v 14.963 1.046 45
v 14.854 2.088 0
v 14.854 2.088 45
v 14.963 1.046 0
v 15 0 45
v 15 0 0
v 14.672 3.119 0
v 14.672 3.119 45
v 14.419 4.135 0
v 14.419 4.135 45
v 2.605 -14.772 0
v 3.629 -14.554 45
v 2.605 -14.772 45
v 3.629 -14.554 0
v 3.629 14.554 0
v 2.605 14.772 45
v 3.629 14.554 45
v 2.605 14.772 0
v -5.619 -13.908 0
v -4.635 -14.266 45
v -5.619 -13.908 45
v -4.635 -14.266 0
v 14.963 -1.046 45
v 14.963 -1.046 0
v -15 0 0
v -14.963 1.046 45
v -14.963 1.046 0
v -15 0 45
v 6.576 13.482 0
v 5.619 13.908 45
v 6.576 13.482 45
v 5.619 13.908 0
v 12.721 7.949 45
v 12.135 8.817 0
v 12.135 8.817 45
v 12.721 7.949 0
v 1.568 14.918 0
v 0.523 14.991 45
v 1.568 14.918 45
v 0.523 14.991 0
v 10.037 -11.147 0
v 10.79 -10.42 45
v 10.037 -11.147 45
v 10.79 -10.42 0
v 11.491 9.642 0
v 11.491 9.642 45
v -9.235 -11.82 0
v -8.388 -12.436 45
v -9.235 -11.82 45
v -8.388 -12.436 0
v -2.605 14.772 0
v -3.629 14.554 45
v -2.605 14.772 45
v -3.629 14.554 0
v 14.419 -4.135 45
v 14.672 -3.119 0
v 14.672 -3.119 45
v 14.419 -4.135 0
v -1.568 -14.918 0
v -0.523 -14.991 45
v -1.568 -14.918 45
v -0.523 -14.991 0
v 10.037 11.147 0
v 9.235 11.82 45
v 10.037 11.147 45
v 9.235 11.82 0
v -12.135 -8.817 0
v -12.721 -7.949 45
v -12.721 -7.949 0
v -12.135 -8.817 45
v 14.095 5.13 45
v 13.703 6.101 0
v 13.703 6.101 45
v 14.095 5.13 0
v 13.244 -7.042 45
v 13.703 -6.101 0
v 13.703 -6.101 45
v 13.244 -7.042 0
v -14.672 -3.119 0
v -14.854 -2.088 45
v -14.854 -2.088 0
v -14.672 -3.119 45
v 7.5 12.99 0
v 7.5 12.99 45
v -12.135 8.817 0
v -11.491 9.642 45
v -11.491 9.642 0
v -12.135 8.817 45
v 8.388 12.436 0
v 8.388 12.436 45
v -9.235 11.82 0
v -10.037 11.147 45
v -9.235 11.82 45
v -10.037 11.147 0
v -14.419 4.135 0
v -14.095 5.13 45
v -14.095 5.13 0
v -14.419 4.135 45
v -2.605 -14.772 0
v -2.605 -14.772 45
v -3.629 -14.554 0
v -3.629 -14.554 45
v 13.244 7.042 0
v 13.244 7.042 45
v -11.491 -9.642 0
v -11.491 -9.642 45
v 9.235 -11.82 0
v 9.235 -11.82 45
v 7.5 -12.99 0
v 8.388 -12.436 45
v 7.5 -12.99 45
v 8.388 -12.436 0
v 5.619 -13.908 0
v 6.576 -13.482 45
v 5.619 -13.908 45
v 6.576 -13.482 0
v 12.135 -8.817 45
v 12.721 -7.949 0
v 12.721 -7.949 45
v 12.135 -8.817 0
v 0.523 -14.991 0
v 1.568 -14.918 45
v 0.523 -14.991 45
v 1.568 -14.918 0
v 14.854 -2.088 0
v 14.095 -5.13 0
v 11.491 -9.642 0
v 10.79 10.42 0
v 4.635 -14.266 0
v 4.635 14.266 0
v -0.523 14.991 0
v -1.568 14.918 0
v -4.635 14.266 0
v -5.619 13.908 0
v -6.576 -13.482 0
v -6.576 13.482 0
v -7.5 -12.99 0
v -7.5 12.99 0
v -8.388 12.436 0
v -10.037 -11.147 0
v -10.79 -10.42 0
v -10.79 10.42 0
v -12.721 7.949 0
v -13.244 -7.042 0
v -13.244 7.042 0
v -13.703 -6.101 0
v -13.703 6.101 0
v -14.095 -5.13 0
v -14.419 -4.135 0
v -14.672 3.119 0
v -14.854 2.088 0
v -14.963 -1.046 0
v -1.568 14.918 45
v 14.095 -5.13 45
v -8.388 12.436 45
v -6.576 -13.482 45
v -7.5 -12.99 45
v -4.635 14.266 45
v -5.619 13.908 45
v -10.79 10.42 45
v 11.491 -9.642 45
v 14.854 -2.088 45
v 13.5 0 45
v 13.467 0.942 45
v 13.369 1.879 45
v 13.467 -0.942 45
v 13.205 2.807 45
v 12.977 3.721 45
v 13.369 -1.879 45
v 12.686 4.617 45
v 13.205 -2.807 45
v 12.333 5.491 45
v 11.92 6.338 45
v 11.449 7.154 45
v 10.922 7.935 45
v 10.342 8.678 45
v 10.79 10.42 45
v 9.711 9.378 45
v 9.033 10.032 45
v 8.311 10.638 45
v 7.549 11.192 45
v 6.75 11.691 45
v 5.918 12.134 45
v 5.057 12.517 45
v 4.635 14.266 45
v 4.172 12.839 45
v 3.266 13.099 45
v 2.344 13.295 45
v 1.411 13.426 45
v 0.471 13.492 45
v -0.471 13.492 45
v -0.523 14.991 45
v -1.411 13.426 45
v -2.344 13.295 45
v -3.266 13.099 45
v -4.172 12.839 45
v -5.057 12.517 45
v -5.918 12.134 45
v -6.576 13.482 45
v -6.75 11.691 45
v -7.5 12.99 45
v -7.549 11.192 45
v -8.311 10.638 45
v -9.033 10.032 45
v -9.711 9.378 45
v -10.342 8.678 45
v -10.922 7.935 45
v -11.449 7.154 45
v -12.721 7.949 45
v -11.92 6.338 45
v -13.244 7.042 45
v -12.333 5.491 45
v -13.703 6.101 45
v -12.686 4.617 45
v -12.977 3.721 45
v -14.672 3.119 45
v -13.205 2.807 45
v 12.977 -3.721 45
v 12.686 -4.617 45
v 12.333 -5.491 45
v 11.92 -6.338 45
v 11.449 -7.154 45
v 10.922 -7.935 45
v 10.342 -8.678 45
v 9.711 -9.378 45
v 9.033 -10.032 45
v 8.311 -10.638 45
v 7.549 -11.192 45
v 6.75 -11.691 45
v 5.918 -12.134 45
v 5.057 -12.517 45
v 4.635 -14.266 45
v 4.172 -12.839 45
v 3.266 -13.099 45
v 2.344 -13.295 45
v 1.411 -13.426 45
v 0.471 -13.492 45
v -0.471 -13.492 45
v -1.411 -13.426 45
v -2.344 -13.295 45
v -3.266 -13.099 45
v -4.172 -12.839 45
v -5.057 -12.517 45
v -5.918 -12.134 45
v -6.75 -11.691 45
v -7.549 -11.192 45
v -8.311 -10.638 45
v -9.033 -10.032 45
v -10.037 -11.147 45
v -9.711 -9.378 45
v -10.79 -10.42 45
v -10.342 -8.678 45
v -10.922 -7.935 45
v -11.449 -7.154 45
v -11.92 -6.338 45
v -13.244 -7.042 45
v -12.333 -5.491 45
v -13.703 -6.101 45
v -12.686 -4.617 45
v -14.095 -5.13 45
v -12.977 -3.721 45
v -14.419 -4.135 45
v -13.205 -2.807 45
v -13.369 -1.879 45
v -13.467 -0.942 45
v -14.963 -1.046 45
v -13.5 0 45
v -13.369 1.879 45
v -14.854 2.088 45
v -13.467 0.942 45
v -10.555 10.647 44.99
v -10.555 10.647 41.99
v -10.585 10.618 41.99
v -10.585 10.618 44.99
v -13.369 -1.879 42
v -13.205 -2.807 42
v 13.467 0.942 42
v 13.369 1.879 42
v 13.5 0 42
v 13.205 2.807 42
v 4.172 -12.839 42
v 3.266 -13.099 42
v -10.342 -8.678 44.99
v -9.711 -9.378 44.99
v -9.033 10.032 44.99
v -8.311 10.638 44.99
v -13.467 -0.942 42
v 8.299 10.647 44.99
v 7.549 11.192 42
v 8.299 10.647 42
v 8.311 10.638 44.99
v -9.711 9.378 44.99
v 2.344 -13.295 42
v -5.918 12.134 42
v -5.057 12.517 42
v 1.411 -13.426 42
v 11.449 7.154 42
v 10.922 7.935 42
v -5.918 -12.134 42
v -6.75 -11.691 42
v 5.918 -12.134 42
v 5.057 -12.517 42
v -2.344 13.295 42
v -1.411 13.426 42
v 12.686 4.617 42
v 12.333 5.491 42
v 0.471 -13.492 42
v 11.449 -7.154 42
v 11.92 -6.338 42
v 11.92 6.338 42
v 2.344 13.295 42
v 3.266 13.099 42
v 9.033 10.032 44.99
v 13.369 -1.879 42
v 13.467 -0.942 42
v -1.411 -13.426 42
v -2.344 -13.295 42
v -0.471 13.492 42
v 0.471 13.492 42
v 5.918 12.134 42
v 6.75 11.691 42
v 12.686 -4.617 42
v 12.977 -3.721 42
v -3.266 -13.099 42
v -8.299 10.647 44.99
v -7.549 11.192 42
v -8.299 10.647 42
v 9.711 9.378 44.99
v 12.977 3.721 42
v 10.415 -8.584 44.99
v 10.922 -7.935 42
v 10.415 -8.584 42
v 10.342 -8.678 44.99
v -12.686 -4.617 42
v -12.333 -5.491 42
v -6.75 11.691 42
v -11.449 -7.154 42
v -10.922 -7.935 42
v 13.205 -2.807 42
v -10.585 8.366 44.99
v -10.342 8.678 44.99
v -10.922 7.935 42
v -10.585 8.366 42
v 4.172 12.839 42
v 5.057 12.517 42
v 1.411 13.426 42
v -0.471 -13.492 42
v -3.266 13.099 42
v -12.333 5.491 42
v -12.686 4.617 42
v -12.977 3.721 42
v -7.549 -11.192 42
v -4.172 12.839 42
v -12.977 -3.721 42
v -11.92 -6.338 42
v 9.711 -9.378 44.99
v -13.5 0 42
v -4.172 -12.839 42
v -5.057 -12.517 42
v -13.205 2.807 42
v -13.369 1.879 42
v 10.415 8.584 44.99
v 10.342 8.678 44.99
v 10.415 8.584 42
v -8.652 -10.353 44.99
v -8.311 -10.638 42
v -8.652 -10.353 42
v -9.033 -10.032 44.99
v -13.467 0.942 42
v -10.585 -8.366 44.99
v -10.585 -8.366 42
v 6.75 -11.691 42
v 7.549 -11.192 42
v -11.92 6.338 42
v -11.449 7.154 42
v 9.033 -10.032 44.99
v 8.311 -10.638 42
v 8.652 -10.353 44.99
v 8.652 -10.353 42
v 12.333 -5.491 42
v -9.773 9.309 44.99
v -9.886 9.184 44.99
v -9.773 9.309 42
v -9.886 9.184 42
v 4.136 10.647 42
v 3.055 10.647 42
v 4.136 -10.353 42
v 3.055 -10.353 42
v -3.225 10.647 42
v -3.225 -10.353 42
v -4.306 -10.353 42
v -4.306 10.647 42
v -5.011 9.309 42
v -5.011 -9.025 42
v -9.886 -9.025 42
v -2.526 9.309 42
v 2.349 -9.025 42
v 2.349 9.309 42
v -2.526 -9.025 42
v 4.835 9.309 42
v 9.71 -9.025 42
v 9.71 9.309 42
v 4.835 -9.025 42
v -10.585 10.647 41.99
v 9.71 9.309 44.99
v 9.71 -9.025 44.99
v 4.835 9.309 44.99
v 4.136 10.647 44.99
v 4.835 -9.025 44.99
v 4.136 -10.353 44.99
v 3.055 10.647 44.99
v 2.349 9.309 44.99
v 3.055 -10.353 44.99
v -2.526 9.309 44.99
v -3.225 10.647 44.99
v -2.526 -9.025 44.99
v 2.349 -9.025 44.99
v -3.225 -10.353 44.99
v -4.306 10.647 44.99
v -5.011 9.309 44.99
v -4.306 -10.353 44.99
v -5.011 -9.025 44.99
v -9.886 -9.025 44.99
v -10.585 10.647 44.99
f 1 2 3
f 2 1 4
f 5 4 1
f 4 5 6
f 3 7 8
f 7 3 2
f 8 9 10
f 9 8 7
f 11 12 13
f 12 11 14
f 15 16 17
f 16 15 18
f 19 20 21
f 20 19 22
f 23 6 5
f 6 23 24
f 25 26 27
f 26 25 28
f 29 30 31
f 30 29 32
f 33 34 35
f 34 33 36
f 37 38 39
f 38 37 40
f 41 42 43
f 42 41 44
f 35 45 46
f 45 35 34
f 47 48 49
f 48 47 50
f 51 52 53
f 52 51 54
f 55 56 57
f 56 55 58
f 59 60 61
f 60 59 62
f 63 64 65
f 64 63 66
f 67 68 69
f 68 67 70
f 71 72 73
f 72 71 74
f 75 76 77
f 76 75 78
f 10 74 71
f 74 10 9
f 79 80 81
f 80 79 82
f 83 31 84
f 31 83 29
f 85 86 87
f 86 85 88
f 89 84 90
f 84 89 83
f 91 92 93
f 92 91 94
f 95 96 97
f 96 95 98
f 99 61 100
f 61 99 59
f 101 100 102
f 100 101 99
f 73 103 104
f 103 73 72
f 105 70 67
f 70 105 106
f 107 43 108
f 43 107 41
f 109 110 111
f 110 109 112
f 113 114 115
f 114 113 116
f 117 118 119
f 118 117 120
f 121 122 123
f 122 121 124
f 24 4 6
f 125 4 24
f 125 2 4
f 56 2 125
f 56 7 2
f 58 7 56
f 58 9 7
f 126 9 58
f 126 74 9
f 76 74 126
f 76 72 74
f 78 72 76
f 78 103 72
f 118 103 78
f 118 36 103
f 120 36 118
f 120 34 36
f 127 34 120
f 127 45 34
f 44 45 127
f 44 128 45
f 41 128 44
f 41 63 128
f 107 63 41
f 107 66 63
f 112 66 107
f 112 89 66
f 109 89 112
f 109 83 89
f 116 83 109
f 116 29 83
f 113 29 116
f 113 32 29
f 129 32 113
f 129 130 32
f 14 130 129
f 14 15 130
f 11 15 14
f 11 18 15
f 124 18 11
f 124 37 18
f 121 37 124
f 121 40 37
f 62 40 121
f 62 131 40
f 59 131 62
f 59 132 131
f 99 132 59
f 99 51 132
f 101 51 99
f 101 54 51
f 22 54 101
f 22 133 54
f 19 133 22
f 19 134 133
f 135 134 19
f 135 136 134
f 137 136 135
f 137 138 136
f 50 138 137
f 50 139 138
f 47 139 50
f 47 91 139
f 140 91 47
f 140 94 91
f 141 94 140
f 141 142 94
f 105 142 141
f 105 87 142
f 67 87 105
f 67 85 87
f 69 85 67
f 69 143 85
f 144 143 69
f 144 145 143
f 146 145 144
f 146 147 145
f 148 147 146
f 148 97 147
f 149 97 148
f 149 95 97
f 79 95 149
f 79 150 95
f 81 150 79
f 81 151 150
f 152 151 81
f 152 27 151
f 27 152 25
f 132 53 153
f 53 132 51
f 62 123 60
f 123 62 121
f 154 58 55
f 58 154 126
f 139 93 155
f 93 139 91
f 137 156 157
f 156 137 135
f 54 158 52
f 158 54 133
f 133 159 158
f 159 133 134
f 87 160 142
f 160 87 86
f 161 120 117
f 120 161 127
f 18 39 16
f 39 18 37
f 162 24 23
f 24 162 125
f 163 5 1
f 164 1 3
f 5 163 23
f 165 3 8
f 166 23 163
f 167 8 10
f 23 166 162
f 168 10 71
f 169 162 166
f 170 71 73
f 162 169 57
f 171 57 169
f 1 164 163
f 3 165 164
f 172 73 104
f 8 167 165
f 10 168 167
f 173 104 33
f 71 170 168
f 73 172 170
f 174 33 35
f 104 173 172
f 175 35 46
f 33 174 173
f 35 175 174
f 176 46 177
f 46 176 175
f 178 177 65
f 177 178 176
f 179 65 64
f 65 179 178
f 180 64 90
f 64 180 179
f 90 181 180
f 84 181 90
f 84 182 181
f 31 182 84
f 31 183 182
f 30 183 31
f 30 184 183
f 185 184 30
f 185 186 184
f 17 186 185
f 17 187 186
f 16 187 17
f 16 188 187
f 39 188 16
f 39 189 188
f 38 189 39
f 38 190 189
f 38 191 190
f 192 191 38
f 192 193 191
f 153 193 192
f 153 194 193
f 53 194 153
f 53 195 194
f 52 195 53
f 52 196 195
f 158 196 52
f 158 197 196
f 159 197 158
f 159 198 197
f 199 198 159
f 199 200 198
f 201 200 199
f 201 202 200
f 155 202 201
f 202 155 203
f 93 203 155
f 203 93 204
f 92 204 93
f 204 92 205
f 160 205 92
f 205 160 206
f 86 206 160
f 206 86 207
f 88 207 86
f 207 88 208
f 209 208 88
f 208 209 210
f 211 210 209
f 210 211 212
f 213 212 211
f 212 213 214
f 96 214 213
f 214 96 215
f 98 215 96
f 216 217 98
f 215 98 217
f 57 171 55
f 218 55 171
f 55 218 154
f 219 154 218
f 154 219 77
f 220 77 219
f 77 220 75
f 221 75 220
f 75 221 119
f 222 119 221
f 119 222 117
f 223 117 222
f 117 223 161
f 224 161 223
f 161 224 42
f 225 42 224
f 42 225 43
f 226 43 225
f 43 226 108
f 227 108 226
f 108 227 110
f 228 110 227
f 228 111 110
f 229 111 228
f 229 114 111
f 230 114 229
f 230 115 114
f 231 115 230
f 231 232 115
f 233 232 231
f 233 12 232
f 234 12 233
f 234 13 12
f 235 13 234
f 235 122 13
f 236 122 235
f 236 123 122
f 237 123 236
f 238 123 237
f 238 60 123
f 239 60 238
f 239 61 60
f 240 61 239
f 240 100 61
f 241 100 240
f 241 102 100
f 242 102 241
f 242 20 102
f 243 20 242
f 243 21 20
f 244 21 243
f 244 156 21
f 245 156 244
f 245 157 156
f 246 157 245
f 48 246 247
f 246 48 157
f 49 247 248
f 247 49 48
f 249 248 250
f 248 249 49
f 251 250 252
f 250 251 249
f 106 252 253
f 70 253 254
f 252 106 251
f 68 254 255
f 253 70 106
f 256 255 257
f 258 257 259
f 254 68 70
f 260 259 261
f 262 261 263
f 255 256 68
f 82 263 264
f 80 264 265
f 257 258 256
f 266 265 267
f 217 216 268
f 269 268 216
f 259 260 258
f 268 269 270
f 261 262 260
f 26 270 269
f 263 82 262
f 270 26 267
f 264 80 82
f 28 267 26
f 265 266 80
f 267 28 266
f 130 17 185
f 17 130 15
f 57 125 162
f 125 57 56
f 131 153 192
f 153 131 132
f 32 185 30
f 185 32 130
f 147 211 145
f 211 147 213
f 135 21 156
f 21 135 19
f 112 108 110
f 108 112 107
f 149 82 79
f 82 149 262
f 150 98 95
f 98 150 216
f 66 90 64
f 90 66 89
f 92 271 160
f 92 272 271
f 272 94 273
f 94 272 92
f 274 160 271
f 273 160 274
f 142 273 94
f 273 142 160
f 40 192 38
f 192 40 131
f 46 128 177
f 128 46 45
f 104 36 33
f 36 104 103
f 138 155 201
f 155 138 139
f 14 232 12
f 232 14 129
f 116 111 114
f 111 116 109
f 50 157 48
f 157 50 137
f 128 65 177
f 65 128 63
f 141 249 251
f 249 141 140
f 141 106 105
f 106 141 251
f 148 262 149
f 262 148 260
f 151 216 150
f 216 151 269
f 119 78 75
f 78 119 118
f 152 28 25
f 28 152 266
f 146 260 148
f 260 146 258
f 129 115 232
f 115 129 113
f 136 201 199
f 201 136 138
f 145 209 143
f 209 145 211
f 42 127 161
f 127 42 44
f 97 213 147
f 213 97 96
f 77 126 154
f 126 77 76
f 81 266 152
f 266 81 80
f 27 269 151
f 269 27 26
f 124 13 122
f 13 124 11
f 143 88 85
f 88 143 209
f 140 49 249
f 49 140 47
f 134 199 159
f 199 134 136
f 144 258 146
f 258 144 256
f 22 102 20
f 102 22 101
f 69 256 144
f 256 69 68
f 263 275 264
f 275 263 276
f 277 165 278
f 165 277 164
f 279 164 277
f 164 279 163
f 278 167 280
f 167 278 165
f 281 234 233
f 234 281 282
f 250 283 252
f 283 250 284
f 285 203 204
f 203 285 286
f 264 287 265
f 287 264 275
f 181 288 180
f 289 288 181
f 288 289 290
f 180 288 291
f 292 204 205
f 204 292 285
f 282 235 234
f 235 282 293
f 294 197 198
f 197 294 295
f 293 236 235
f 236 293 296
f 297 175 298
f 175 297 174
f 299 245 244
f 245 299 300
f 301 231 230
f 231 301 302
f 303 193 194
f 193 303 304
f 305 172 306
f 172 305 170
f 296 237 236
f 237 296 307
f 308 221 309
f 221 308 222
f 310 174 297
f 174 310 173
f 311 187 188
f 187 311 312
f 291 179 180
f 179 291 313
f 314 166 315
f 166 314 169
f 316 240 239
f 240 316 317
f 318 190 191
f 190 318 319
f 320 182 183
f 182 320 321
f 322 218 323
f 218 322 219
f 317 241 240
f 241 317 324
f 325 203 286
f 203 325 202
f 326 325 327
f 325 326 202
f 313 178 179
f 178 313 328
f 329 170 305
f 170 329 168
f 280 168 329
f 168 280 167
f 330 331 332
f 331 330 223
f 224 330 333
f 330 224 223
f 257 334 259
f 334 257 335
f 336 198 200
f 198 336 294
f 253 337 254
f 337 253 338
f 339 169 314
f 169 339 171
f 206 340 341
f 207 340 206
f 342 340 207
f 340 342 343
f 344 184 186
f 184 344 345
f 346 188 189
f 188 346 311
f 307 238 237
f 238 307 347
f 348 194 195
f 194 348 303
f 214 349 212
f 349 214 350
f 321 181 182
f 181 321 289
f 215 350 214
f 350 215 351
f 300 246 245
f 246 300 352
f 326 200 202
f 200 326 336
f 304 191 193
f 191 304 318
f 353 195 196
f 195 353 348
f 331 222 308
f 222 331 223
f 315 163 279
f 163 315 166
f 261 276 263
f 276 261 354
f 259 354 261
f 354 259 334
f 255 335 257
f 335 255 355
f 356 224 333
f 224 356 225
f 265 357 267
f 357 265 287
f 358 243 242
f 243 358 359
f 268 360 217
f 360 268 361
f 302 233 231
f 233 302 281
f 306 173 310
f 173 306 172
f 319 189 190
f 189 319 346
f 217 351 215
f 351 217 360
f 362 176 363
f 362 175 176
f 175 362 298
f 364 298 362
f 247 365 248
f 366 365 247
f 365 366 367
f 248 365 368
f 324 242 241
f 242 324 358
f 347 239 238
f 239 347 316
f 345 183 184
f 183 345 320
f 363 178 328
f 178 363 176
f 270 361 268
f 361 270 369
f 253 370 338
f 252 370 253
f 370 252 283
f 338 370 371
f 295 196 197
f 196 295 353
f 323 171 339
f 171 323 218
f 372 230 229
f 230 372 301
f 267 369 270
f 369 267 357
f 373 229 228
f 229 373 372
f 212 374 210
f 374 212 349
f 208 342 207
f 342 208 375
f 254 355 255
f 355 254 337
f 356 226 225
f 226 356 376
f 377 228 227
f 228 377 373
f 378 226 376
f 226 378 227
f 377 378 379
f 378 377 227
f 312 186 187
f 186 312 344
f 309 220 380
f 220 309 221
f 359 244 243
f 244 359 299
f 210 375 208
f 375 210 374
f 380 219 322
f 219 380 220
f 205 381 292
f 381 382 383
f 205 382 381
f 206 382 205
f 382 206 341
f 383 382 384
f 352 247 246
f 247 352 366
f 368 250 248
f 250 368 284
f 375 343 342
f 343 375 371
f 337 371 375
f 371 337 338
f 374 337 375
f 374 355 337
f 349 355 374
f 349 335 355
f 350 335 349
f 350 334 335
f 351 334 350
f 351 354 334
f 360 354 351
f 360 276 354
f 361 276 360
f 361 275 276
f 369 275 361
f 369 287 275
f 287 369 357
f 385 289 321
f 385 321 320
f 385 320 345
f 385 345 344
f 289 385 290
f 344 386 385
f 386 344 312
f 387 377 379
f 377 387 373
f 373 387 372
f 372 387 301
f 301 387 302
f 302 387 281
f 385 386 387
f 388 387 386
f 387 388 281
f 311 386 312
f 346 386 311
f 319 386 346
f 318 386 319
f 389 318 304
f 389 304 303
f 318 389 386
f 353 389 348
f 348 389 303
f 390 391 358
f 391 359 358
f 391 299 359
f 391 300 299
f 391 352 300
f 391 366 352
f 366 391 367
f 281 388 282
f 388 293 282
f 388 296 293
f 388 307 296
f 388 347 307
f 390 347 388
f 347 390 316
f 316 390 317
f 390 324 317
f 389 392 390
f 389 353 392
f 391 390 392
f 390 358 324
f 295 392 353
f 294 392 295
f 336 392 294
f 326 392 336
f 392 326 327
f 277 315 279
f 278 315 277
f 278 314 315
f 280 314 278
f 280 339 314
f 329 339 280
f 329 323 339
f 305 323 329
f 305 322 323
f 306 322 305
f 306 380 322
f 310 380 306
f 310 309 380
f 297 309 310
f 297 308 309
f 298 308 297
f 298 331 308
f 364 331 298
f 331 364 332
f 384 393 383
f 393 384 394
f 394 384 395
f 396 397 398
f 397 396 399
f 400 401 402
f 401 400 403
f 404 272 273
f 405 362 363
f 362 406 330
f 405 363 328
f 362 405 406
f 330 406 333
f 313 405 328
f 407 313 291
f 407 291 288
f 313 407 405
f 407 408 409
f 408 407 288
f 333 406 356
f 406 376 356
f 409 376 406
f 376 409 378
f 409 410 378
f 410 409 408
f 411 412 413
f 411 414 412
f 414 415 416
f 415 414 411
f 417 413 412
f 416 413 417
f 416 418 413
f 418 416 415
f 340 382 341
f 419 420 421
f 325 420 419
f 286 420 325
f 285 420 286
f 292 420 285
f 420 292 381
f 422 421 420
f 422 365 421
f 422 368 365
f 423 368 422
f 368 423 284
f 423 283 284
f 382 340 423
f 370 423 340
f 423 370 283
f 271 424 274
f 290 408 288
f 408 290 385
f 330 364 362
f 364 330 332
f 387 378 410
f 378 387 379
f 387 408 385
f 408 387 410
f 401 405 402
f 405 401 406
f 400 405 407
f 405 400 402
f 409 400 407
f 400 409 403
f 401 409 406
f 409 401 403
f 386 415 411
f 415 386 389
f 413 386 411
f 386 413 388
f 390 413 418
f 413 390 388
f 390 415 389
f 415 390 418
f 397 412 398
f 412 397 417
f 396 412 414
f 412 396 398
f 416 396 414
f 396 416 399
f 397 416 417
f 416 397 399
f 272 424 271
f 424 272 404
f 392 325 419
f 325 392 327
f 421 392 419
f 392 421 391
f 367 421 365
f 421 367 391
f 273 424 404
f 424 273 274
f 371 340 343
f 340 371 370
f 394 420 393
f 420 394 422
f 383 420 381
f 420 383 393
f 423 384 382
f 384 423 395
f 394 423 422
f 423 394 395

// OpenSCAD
$fn = 90;

// Type of dojang: 1 - Square, 2 - Circular
TYPE = 2; 

// Font to use. I recommend using a bold font so it prints better. The font will be system dependent. On Ubuntu 18.04, "NanumMyeongjo:style=Bold" is a good font
FONT = "NanumMyeongjo:style=Bold";

// Name to put on Dojang. The name will be centered and cropped to the size of the Dojang
NAME1 = "정민주";

// 2nd line of name. Optional. Set to "" to exclude. 
NAME2 = "";

// Text Height
TH = 3;

// Width of the Dojang. Diameter if a circular dojang. Length of a side if its square
W = 30;

// Height of Dojang. 
H = 45;

// Border Thickness
BORDER = 3;

// X Resize - Set to resize value for X direction, W-3*BORDER is a good value. Set to 0 to not resize
XRESIZE = W-3*BORDER;

// Y Resize - Set to resize value for Y direction, W-3*BORDER is a good value. Set to 0 to not resize
YRESIZE = W-3*BORDER;
//YRESIZE = 0;

// Y Offset - Set to 0 if only 1 line name. Set to an appropriate offset in mm if 2 line name. 5 is a good default.
YOFFSET = 0;
//YOFFSET = 5;


module name () {
    mirror([1,0,0])
        translate([0,YOFFSET,H-TH/2-0.01])
        resize([XRESIZE,YRESIZE,TH])
        linear_extrude(height = TH+0.01, center = true, convexity = 10, twist = 0) {    
            text(NAME1, halign="center", valign="center", font=FONT);
            if (NAME2 != "") {
                translate([0,-15,0])
                    text(NAME2, halign="center", valign="center", font=FONT);
            }
        }
}


name();
if (TYPE == 1) { // Square stamp
    translate([0,0,(H-TH)/2]) cube([W, W, H-TH], center=true);    
    difference () {
        translate([0,0,H/2]) cube([W, W, H], center=true);    
        translate([0,0,H/2]) cube([W-BORDER, W-BORDER, H*1.5], center=true);    
    }    
} else if (TYPE == 2) { // Circular stamp
    translate([0,0,(H-TH)/2]) cylinder(d=W, h=H-TH, center=true);    
    difference () {
        translate([0,0,H/2]) cylinder(d=W, h=H, center=true);    
        translate([0,0,H/2]) cylinder(d=W-BORDER, h=H*1.5, center=true);    
        }
} 
